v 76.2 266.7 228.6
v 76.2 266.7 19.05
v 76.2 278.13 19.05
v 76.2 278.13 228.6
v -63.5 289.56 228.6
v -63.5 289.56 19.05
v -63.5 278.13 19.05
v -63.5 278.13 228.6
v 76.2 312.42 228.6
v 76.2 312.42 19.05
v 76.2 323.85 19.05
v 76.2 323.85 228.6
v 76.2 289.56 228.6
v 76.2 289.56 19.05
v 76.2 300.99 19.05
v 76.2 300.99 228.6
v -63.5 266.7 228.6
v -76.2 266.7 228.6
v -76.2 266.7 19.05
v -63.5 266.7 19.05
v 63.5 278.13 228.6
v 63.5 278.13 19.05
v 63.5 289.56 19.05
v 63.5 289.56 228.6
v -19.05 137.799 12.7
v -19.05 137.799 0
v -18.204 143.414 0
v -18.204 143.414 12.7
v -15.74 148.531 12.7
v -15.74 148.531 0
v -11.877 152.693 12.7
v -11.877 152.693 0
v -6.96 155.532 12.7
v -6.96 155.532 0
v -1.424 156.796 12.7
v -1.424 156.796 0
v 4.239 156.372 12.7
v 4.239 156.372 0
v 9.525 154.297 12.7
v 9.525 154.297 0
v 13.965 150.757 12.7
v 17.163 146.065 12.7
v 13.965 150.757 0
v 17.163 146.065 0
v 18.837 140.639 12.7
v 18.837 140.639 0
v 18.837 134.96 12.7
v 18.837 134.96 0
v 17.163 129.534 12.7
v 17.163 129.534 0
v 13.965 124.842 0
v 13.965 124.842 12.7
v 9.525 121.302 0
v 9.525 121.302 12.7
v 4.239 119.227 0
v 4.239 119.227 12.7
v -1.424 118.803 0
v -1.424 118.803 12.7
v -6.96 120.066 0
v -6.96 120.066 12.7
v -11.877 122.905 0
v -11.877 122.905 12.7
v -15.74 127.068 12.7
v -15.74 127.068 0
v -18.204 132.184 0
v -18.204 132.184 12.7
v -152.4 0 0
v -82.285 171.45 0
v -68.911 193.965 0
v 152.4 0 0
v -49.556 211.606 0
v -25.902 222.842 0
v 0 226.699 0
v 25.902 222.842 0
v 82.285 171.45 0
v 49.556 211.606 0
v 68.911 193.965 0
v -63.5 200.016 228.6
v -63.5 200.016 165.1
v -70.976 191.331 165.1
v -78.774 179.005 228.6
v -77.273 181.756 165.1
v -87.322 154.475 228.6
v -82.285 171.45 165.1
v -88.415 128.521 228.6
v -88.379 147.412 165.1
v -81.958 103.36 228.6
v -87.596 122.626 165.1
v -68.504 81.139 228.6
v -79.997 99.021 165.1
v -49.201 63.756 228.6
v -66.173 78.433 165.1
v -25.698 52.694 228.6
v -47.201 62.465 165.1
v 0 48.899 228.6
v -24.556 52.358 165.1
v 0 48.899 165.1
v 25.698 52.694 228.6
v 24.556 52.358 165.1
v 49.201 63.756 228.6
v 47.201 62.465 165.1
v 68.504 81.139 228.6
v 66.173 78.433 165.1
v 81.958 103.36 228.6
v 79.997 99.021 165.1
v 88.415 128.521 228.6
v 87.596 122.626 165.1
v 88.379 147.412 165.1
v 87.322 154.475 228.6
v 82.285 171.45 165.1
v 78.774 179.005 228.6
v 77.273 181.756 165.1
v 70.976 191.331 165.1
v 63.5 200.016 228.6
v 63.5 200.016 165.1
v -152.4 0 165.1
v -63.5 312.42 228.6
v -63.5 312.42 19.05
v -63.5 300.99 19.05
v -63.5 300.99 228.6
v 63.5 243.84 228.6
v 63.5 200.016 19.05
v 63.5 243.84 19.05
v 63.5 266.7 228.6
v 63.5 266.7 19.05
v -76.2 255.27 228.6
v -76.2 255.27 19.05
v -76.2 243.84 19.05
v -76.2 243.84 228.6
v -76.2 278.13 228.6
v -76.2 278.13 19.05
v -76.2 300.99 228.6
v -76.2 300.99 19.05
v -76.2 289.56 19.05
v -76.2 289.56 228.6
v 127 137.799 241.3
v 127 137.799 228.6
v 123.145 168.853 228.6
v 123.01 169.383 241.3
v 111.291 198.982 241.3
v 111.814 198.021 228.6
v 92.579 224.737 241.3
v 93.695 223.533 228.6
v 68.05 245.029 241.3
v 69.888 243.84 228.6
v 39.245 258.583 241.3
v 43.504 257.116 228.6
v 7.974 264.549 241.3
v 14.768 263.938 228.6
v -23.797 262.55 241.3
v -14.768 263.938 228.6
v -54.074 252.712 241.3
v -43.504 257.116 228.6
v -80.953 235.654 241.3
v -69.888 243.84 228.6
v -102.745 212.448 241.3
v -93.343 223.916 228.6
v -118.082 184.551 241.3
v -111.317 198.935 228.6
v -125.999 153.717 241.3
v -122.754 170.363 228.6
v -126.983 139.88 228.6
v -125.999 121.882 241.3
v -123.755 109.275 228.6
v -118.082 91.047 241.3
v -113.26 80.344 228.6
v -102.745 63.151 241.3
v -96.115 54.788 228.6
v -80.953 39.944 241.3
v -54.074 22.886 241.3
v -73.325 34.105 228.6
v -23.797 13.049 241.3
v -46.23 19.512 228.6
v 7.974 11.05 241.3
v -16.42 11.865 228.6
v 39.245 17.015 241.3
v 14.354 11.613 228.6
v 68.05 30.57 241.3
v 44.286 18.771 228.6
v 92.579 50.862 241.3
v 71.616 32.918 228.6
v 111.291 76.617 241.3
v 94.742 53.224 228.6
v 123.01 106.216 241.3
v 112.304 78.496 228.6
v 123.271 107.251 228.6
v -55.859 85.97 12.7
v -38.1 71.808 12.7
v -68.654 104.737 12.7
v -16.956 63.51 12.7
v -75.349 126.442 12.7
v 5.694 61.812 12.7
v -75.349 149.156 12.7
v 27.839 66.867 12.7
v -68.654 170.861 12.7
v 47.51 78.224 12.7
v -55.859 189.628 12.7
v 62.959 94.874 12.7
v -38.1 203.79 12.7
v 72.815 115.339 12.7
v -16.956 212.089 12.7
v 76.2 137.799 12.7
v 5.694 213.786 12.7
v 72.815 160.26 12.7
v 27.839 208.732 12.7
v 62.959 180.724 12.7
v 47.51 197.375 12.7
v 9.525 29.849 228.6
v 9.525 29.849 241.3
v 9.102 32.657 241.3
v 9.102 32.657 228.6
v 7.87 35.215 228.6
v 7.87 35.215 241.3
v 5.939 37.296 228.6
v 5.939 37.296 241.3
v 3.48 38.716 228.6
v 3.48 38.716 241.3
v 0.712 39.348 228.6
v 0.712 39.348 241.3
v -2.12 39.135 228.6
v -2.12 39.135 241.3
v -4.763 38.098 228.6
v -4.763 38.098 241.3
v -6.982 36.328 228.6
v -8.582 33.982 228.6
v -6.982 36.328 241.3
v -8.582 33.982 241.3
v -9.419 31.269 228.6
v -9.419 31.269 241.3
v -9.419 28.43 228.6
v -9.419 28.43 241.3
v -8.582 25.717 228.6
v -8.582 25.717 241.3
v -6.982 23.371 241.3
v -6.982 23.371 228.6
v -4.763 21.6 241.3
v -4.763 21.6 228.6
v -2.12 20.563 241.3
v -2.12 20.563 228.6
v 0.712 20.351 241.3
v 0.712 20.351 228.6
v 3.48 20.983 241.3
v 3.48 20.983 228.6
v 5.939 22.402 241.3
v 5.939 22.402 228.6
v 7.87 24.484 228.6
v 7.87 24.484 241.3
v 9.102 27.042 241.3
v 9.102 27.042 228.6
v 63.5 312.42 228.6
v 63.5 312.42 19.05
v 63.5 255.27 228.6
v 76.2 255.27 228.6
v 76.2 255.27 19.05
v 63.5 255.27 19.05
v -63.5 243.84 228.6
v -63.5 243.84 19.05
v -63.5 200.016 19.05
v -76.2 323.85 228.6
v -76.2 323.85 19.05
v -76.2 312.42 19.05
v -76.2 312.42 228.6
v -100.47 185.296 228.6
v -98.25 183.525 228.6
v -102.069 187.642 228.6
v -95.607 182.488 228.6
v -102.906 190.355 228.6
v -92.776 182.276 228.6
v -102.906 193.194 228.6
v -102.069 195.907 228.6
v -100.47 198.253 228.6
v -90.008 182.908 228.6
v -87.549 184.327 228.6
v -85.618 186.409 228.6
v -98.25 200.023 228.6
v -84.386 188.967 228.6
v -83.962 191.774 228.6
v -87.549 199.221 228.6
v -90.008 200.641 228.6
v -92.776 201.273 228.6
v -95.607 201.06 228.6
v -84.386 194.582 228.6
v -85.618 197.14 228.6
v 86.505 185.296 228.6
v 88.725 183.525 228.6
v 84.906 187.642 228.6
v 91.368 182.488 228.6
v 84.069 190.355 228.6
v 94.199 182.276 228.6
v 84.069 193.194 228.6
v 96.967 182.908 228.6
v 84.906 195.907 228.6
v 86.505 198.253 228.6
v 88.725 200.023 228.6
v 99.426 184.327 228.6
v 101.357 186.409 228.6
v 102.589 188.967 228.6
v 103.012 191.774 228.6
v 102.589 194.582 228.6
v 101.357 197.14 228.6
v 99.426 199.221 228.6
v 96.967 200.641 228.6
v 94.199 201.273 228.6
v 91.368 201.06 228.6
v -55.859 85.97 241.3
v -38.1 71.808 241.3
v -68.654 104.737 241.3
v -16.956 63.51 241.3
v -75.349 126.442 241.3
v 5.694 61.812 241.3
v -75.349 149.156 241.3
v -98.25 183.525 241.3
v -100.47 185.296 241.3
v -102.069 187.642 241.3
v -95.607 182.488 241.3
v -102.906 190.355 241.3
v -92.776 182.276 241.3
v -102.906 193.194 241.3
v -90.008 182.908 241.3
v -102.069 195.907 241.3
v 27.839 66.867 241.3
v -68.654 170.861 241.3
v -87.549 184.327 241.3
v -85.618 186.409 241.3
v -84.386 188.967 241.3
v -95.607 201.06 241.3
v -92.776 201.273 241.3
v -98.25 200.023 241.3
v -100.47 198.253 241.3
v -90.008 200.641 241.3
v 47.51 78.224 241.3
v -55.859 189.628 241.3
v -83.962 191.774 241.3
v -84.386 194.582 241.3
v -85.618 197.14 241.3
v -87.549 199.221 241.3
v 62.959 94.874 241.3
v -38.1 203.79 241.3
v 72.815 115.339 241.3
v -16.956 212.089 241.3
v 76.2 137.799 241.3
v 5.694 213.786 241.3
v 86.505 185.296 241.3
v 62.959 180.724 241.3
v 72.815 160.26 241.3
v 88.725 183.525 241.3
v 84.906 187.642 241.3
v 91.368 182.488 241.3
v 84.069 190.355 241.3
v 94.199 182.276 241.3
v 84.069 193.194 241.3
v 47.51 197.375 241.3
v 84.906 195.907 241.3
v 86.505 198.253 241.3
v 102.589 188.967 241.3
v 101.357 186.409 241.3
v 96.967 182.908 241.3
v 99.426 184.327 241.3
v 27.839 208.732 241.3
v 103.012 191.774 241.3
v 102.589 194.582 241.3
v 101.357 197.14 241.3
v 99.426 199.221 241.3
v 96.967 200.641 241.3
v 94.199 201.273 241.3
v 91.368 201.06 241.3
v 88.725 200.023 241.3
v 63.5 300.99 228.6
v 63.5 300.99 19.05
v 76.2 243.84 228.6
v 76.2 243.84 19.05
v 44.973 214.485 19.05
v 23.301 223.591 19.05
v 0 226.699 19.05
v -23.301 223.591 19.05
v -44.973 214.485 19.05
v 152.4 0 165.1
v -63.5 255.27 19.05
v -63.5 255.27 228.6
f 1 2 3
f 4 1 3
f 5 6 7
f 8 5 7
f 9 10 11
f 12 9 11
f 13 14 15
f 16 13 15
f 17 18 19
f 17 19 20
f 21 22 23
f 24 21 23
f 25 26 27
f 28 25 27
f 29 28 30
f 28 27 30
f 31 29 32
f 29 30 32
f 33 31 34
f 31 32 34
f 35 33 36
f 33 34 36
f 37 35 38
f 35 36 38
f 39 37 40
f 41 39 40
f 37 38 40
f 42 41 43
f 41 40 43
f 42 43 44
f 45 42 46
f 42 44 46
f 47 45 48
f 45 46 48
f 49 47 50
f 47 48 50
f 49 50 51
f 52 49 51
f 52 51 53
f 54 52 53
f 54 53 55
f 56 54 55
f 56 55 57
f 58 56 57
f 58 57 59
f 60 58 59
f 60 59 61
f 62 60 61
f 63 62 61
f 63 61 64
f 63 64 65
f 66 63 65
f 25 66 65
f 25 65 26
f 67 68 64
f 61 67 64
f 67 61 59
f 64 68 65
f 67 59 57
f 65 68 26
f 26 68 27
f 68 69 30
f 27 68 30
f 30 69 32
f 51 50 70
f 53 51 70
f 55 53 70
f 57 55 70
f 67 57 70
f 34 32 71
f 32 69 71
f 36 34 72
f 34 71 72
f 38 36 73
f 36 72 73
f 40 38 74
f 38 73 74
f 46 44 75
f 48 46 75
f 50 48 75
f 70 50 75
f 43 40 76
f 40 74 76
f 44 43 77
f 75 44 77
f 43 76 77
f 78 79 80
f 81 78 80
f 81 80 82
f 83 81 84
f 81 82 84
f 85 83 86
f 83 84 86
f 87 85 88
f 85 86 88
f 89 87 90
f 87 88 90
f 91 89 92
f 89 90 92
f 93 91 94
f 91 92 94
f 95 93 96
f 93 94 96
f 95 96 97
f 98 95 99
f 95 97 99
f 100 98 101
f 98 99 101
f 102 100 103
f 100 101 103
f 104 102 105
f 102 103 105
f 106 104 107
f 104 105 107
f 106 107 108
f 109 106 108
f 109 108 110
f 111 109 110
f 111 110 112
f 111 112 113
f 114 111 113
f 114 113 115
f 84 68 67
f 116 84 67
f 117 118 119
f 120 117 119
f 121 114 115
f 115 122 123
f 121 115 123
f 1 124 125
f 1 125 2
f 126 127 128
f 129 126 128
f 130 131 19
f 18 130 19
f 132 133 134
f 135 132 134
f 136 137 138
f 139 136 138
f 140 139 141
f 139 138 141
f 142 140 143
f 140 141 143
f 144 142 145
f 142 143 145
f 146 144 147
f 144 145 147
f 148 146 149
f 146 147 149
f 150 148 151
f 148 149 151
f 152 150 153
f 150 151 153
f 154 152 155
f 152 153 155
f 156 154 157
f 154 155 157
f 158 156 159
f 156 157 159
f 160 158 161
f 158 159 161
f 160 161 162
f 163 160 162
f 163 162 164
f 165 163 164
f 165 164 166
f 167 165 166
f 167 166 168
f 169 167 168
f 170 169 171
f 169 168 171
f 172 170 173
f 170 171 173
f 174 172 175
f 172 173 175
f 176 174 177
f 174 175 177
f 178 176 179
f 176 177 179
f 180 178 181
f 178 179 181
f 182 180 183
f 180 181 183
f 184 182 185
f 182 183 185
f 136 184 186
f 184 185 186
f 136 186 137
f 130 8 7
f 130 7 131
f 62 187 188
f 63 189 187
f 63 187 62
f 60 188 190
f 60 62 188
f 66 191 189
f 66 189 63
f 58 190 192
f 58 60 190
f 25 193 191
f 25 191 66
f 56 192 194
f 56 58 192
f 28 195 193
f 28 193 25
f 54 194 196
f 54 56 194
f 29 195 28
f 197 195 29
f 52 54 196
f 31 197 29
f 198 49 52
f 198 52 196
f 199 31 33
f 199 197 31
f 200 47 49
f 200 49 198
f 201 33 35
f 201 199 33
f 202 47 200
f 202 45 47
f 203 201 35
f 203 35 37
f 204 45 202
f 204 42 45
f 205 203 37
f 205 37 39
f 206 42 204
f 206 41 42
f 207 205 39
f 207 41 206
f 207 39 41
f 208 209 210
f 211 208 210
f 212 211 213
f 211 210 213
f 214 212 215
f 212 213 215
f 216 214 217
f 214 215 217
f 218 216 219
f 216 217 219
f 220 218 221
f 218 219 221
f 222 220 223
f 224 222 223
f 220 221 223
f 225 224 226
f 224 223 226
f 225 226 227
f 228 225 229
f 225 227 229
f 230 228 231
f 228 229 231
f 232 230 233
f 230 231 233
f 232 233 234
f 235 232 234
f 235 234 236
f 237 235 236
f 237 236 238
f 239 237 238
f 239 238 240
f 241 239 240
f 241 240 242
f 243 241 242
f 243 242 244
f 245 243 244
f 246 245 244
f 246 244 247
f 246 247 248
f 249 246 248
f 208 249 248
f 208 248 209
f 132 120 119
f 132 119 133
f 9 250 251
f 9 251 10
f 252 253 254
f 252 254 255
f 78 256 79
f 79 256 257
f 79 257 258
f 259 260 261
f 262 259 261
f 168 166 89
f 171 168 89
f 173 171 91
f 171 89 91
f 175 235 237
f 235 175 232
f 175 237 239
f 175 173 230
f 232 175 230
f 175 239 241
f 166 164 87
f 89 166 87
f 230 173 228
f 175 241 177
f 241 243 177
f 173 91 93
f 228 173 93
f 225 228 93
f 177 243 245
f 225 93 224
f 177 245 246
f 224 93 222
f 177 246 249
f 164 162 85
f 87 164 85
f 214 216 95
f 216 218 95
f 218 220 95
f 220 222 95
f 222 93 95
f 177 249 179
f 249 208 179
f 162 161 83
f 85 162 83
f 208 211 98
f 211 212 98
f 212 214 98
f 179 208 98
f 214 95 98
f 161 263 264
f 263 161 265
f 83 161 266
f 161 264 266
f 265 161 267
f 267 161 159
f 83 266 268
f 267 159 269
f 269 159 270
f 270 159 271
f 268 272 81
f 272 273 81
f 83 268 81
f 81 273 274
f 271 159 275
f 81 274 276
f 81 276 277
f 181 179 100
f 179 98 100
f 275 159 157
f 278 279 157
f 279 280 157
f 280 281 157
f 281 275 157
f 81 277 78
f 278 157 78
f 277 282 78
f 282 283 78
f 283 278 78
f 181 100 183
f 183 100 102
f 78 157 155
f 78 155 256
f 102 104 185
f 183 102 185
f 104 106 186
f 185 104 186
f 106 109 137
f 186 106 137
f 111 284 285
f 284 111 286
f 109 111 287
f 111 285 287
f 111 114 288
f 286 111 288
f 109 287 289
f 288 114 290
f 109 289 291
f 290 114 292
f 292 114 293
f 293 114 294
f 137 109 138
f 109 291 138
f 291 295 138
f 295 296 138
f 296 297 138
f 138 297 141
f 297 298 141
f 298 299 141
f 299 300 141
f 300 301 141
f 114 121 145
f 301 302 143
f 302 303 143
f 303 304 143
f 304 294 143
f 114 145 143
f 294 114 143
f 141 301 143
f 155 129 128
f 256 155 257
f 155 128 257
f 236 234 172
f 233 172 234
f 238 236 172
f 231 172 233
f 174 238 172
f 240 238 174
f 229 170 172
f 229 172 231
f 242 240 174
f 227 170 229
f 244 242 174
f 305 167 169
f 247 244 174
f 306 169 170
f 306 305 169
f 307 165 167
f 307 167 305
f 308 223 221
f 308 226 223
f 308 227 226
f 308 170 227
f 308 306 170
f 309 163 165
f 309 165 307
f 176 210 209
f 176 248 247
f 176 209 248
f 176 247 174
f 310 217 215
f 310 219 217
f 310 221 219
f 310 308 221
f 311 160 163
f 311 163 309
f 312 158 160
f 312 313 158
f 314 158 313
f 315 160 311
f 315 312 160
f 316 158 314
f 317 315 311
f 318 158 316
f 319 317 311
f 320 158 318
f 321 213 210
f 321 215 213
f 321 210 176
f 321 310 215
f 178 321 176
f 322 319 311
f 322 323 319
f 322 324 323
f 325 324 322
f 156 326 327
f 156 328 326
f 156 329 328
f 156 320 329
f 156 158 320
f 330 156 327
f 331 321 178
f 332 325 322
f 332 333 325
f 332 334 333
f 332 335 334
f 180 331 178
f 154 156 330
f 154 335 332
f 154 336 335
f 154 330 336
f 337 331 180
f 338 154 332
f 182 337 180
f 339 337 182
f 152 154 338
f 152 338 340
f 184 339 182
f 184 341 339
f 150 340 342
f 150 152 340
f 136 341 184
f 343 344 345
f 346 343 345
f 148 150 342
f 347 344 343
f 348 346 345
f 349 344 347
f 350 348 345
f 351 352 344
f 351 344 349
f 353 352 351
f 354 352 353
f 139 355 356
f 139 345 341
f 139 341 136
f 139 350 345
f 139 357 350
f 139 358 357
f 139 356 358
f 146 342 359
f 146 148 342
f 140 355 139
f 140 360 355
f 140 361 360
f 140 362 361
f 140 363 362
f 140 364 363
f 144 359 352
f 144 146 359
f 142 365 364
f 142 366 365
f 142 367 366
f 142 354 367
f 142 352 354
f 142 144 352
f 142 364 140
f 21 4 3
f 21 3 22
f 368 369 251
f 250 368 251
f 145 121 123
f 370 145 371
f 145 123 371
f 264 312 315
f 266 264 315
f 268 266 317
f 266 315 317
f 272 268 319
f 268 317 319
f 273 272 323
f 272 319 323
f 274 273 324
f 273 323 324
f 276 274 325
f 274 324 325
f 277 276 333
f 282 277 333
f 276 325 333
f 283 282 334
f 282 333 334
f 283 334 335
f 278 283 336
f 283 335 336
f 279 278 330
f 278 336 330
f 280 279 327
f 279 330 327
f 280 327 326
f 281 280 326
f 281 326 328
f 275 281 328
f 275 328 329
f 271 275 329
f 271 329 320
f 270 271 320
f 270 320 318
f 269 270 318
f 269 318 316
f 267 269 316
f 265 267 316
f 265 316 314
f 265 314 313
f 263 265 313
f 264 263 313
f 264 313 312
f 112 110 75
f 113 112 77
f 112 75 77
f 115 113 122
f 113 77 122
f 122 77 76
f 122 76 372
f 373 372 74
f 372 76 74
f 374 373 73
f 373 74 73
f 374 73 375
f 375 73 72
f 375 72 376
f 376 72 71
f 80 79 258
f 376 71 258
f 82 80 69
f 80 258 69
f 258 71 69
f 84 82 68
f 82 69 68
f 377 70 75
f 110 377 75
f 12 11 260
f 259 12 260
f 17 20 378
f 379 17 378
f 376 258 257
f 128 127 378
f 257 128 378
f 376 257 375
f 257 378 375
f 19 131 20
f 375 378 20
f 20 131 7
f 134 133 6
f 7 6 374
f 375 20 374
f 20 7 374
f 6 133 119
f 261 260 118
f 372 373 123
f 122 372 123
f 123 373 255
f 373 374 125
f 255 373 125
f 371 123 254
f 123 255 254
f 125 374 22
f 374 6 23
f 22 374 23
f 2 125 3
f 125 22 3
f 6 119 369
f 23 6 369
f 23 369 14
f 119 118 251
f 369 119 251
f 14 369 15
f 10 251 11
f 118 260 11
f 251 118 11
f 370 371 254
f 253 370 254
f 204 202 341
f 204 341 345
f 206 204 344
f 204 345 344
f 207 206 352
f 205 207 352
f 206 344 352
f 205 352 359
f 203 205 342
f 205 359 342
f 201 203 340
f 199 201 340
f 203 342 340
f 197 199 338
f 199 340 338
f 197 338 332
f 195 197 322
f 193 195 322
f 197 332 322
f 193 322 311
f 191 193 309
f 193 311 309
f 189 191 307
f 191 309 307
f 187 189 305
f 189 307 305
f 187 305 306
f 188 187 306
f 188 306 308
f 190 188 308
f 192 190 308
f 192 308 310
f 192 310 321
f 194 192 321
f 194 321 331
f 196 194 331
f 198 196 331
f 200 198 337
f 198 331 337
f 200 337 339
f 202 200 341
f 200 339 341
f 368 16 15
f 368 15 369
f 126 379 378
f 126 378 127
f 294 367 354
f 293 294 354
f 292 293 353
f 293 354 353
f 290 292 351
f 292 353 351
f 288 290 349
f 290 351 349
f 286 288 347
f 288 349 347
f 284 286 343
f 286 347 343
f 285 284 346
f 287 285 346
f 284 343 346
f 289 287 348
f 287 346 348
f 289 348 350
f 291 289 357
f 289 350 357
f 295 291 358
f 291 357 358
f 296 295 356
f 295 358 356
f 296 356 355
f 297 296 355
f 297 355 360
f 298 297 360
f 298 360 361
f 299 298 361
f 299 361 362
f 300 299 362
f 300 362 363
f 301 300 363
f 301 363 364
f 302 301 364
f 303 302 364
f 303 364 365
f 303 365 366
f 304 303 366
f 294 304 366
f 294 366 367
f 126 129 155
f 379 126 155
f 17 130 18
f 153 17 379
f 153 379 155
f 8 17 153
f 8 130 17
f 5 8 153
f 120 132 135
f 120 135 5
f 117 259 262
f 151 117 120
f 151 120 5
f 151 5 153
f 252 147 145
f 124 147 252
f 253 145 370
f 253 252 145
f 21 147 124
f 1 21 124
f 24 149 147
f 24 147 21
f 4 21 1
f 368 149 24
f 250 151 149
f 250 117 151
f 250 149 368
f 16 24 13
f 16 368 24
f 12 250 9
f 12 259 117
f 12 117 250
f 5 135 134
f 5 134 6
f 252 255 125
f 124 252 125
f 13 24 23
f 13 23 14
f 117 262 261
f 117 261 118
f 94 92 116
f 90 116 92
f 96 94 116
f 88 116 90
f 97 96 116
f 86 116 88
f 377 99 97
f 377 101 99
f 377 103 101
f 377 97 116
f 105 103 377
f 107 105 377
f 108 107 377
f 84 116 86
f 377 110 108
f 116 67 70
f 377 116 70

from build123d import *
from build123d.topology import SkipClean

# Parameters (mm, degrees)
BOSS_EXTRUDE1_DEPTH = 165.1
SKETCH2_R           = 88.9
BOSS_EXTRUDE2_DEPTH = 63.5
SKETCH3_R           = 127
BOSS_EXTRUDE3_DEPTH = 12.7
BOSS_EXTRUDE4_DEPTH = 209.55
SKETCH6_R           = 76.2
CUT_EXTRUDE1_DEPTH  = 228.6
CUT_EXTRUDE2_REACH  = 433.66
SKETCH7_R           = 19.05
CUT_EXTRUDE3_REACH  = 433.66
SKETCH9_R           = 9.525
CIRPATTERN1_COUNT   = 3


with BuildPart() as part:
    # Sketch1 → Boss-Extrude1 (new body)
    with BuildSketch(Plane.XY):
        with BuildLine():
            Line((-152.4, 0), (152.4, 0))
            Line((152.4, 0), (82.285119295, 171.45))
            ThreePointArc((82.285119295, 171.45), (0, 226.699306951), (-82.285119295, 171.45))
            Line((-82.285119295, 171.45), (-152.4, 0))
        make_face()
    extrude(amount=BOSS_EXTRUDE1_DEPTH)

    # Sketch2 → Boss-Extrude2 (add)
    with BuildSketch(Plane.XY.offset(165.1)):
        with Locations(Location((0, 137.799306951, 0), (0, 0, 157.757777303))):
            Circle(SKETCH2_R)
    extrude(amount=BOSS_EXTRUDE2_DEPTH)

    # Sketch3 → Boss-Extrude3 (add)
    with BuildSketch(Plane.XY.offset(228.6)):
        with Locations((0, 137.799306951)):
            Circle(SKETCH3_R)
    extrude(amount=BOSS_EXTRUDE3_DEPTH)

    # Sketch4 → Boss-Extrude4 (add)
    with SkipClean():  # the faces are left unmerged after this step: merging them gives an invalid solid
        with BuildSketch(Plane(origin=(0, 0, 19.05), x_dir=(-1, 0, 0), z_dir=(0, 0, -1))):
            with BuildLine():
                Line((-63.5, 189.570098967), (-63.5, 243.84))
                Line((-63.5, 243.84), (-76.2, 243.84))
                Line((-76.2, 243.84), (-76.2, 255.27))
                Line((-76.2, 255.27), (-63.5, 255.27))
                Line((-63.5, 255.27), (-63.5, 266.7))
                Line((-63.5, 266.7), (-76.2, 266.7))
                Line((-76.2, 266.7), (-76.2, 278.13))
                Line((-76.2, 278.13), (-63.5, 278.13))
                Line((-63.5, 278.13), (-63.5, 289.56))
                Line((-63.5, 289.56), (-76.2, 289.56))
                Line((-76.2, 289.56), (-76.2, 300.99))
                Line((-76.2, 300.99), (-63.5, 300.99))
                Line((-63.5, 300.99), (-63.5, 312.42))
                Line((-63.5, 312.42), (-76.2, 312.42))
                Line((-76.2, 312.42), (-76.2, 323.85))
                Line((-76.2, 323.85), (76.2, 323.85))
                Line((76.2, 323.85), (76.2, 312.42))
                Line((76.2, 312.42), (63.5, 312.42))
                Line((63.5, 312.42), (63.5, 300.99))
                Line((63.5, 300.99), (76.2, 300.99))
                Line((76.2, 300.99), (76.2, 289.56))
                Line((76.2, 289.56), (63.5, 289.56))
                Line((63.5, 289.56), (63.5, 278.13))
                Line((63.5, 278.13), (76.2, 278.13))
                Line((76.2, 278.13), (76.2, 266.7))
                Line((76.2, 266.7), (63.5, 266.7))
                Line((63.5, 266.7), (63.5, 255.27))
                Line((63.5, 255.27), (76.2, 255.27))
                Line((76.2, 255.27), (76.2, 243.84))
                Line((76.2, 243.84), (63.5, 243.84))
                Line((63.5, 243.84), (63.5, 189.570098967))
                ThreePointArc((63.5, 189.570098967), (0, 219.728940821), (-63.5, 189.570098967))
            make_face()
        extrude(amount=-BOSS_EXTRUDE4_DEPTH)

    # Sketch6 → Cut-Extrude1 (cut)
    with SkipClean():  # the faces are left unmerged after this step: merging them gives an invalid solid
        with BuildSketch(Plane.XY.offset(241.3)):
            with Locations((0, 137.799306951)):
                Circle(SKETCH6_R)
        extrude(amount=-CUT_EXTRUDE1_DEPTH, mode=Mode.SUBTRACT)

    # Sketch7 → Cut-Extrude2 (cut, up to next)
    with BuildSketch(Plane(origin=(0, 0, 0), x_dir=(-1, 0, 0), z_dir=(0, 0, -1)), mode=Mode.PRIVATE) as cut_extrude2_sk1:
        with Locations((0, 137.799306951)):
            Circle(SKETCH7_R)
    cut_extrude2_tool1 = extrude(cut_extrude2_sk1.sketch, amount=-CUT_EXTRUDE2_REACH, mode=Mode.PRIVATE) & part.part
    add(cut_extrude2_tool1.solids().sort_by_distance((0, 137.799307, 0))[0], mode=Mode.SUBTRACT)

    # Sketch9 → Cut-Extrude3 (cut, up to next)
    with BuildSketch(Plane.XY.offset(241.3), mode=Mode.PRIVATE) as cut_extrude3_sk1:
        with Locations((0, 29.849306951)):
            Circle(SKETCH9_R)
    cut_extrude3_tool1 = extrude(cut_extrude3_sk1.sketch, amount=-CUT_EXTRUDE3_REACH, mode=Mode.PRIVATE) & part.part
    cut_extrude3 = cut_extrude3_tool1.solids().sort_by_distance((0, 29.849307, 241.3))[0]
    add(cut_extrude3, mode=Mode.SUBTRACT)

    # CirPattern1: Cut-Extrude3 ×3 about axis
    with SkipClean():  # the faces are left unmerged after this step: merging them gives an invalid solid
        cirpattern1_axis = Axis((0, 137.799306951, 0), (0, 0, 1))
        for i in range(1, CIRPATTERN1_COUNT):
            add(cut_extrude3.rotate(cirpattern1_axis, i * 360 / CIRPATTERN1_COUNT), mode=Mode.SUBTRACT)


solid = part.part
